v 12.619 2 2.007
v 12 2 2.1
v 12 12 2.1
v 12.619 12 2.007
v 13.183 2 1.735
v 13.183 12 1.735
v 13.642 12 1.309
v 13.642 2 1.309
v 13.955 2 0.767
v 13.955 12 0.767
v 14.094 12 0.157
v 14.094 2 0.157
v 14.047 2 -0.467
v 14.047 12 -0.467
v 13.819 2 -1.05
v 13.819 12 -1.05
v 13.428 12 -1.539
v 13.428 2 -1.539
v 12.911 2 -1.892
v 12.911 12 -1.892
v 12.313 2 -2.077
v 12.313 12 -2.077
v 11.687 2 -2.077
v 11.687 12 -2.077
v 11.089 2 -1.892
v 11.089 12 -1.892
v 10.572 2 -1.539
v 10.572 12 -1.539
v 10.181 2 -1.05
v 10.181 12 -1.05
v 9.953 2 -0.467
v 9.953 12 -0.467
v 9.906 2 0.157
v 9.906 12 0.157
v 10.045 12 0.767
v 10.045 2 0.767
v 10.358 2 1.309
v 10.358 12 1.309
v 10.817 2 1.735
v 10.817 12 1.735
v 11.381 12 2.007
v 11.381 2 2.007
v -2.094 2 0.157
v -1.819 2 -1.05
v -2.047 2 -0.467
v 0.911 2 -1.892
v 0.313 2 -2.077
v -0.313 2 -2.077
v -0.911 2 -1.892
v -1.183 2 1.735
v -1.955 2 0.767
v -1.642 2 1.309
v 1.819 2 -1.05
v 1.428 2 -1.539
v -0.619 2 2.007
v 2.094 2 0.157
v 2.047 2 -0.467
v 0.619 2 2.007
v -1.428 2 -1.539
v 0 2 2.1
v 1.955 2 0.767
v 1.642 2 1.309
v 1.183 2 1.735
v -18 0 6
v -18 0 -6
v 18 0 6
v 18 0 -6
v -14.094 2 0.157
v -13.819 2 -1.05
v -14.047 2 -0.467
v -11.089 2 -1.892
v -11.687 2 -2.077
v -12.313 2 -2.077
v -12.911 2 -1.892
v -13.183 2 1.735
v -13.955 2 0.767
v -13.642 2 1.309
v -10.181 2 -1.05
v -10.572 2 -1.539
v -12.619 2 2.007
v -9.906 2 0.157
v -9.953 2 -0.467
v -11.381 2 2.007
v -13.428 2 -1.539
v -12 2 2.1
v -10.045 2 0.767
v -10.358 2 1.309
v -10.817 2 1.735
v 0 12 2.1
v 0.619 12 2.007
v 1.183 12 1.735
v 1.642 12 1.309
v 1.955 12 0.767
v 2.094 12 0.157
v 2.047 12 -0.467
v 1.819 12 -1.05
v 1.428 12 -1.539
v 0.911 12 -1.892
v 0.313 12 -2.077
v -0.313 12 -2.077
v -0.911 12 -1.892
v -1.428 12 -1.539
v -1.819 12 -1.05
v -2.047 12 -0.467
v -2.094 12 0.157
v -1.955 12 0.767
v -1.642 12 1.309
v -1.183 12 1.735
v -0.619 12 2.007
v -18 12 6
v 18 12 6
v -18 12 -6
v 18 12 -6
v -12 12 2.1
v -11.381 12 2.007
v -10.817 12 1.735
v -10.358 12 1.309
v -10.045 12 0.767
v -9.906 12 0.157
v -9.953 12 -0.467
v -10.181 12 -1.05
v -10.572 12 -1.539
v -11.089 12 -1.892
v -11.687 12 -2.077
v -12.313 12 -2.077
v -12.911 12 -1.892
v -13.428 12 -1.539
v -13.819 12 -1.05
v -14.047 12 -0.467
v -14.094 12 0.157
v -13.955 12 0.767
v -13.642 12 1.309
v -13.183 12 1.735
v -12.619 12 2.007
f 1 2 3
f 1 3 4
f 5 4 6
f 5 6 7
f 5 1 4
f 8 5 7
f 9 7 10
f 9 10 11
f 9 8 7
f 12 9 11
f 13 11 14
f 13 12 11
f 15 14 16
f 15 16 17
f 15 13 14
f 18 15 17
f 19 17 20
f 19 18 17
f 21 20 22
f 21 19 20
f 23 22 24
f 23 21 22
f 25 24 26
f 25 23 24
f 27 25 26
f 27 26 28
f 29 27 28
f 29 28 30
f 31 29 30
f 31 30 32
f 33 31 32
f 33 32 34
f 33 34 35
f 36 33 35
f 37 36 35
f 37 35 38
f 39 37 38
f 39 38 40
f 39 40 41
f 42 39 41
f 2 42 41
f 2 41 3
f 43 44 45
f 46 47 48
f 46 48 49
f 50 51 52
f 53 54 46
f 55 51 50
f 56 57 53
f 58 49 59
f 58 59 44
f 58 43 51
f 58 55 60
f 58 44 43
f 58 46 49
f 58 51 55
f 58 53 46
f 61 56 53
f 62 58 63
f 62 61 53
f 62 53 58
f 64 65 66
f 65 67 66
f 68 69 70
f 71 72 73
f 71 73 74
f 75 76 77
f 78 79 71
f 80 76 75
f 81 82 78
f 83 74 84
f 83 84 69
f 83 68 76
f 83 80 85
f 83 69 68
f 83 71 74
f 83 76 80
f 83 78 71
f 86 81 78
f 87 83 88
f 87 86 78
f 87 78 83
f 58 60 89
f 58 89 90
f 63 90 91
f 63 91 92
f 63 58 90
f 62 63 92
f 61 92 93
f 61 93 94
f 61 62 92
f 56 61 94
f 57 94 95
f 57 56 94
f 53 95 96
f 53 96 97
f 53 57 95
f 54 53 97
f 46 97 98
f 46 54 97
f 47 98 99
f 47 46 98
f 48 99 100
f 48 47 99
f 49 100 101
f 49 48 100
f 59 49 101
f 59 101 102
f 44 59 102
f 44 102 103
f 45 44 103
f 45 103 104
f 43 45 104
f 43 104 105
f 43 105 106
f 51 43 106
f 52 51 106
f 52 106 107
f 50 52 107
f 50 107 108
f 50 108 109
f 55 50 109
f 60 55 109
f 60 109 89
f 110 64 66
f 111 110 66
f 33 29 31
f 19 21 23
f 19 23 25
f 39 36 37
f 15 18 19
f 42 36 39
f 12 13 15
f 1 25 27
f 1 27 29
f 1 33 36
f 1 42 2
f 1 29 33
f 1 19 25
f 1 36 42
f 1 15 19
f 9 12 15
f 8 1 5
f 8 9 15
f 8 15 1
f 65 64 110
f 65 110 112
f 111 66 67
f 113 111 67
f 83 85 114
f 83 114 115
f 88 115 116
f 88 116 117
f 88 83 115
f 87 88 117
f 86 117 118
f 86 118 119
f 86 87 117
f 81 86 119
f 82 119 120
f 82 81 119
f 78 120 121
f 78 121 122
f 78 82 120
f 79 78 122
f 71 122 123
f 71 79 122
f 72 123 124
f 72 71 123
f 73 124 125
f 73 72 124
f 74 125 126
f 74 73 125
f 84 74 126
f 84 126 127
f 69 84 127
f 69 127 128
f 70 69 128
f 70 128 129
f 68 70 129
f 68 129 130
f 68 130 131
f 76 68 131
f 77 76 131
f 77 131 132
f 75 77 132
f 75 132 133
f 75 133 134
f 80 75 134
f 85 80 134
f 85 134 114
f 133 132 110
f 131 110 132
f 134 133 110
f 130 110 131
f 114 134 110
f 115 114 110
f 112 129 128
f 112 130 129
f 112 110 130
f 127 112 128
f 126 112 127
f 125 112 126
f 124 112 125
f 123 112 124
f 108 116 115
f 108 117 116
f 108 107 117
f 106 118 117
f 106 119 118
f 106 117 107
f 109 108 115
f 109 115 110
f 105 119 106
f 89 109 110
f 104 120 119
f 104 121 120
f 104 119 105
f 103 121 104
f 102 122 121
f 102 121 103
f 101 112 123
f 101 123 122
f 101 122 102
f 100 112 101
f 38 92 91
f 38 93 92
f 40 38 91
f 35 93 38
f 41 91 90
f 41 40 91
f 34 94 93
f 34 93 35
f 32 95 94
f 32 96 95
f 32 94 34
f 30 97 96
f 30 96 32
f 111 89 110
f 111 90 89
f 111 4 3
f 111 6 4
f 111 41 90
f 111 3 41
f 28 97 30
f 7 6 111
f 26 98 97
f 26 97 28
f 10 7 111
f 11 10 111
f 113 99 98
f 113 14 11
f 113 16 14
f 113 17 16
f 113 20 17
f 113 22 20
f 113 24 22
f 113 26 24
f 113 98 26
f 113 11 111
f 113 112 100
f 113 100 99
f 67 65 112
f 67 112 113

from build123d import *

# Parameters (mm, degrees)
SKETCH1_W           = 36
SKETCH1_H           = 12
SKETCH1_R           = 2.1
BOSS_EXTRUDE1_DEPTH = 12
SKETCH1_2_R         = 2.1
BOSS_EXTRUDE2_DEPTH = 2


with BuildPart() as part:
    # Sketch1 → Boss-Extrude1 (new body)
    with BuildSketch(Plane(origin=(0, 0, 0), x_dir=(1, 0, 0), z_dir=(0, 1, 0))):
        Rectangle(SKETCH1_W, SKETCH1_H)
        Circle(SKETCH1_R, mode=Mode.SUBTRACT)
        with Locations((-12, 0)):
            Circle(SKETCH1_R, mode=Mode.SUBTRACT)
        with Locations((12, 0)):
            Circle(SKETCH1_R, mode=Mode.SUBTRACT)
    extrude(amount=BOSS_EXTRUDE1_DEPTH)

    # Sketch1<2> → Boss-Extrude2 (add)
    with BuildSketch(Plane(origin=(0, 0, 0), x_dir=(1, 0, 0), z_dir=(0, 1, 0))):
        Circle(SKETCH1_2_R)
        with Locations((-12, 0)):
            Circle(SKETCH1_2_R)
        with Locations((12, 0)):
            Circle(SKETCH1_2_R)
    extrude(amount=BOSS_EXTRUDE2_DEPTH)


solid = part.part
